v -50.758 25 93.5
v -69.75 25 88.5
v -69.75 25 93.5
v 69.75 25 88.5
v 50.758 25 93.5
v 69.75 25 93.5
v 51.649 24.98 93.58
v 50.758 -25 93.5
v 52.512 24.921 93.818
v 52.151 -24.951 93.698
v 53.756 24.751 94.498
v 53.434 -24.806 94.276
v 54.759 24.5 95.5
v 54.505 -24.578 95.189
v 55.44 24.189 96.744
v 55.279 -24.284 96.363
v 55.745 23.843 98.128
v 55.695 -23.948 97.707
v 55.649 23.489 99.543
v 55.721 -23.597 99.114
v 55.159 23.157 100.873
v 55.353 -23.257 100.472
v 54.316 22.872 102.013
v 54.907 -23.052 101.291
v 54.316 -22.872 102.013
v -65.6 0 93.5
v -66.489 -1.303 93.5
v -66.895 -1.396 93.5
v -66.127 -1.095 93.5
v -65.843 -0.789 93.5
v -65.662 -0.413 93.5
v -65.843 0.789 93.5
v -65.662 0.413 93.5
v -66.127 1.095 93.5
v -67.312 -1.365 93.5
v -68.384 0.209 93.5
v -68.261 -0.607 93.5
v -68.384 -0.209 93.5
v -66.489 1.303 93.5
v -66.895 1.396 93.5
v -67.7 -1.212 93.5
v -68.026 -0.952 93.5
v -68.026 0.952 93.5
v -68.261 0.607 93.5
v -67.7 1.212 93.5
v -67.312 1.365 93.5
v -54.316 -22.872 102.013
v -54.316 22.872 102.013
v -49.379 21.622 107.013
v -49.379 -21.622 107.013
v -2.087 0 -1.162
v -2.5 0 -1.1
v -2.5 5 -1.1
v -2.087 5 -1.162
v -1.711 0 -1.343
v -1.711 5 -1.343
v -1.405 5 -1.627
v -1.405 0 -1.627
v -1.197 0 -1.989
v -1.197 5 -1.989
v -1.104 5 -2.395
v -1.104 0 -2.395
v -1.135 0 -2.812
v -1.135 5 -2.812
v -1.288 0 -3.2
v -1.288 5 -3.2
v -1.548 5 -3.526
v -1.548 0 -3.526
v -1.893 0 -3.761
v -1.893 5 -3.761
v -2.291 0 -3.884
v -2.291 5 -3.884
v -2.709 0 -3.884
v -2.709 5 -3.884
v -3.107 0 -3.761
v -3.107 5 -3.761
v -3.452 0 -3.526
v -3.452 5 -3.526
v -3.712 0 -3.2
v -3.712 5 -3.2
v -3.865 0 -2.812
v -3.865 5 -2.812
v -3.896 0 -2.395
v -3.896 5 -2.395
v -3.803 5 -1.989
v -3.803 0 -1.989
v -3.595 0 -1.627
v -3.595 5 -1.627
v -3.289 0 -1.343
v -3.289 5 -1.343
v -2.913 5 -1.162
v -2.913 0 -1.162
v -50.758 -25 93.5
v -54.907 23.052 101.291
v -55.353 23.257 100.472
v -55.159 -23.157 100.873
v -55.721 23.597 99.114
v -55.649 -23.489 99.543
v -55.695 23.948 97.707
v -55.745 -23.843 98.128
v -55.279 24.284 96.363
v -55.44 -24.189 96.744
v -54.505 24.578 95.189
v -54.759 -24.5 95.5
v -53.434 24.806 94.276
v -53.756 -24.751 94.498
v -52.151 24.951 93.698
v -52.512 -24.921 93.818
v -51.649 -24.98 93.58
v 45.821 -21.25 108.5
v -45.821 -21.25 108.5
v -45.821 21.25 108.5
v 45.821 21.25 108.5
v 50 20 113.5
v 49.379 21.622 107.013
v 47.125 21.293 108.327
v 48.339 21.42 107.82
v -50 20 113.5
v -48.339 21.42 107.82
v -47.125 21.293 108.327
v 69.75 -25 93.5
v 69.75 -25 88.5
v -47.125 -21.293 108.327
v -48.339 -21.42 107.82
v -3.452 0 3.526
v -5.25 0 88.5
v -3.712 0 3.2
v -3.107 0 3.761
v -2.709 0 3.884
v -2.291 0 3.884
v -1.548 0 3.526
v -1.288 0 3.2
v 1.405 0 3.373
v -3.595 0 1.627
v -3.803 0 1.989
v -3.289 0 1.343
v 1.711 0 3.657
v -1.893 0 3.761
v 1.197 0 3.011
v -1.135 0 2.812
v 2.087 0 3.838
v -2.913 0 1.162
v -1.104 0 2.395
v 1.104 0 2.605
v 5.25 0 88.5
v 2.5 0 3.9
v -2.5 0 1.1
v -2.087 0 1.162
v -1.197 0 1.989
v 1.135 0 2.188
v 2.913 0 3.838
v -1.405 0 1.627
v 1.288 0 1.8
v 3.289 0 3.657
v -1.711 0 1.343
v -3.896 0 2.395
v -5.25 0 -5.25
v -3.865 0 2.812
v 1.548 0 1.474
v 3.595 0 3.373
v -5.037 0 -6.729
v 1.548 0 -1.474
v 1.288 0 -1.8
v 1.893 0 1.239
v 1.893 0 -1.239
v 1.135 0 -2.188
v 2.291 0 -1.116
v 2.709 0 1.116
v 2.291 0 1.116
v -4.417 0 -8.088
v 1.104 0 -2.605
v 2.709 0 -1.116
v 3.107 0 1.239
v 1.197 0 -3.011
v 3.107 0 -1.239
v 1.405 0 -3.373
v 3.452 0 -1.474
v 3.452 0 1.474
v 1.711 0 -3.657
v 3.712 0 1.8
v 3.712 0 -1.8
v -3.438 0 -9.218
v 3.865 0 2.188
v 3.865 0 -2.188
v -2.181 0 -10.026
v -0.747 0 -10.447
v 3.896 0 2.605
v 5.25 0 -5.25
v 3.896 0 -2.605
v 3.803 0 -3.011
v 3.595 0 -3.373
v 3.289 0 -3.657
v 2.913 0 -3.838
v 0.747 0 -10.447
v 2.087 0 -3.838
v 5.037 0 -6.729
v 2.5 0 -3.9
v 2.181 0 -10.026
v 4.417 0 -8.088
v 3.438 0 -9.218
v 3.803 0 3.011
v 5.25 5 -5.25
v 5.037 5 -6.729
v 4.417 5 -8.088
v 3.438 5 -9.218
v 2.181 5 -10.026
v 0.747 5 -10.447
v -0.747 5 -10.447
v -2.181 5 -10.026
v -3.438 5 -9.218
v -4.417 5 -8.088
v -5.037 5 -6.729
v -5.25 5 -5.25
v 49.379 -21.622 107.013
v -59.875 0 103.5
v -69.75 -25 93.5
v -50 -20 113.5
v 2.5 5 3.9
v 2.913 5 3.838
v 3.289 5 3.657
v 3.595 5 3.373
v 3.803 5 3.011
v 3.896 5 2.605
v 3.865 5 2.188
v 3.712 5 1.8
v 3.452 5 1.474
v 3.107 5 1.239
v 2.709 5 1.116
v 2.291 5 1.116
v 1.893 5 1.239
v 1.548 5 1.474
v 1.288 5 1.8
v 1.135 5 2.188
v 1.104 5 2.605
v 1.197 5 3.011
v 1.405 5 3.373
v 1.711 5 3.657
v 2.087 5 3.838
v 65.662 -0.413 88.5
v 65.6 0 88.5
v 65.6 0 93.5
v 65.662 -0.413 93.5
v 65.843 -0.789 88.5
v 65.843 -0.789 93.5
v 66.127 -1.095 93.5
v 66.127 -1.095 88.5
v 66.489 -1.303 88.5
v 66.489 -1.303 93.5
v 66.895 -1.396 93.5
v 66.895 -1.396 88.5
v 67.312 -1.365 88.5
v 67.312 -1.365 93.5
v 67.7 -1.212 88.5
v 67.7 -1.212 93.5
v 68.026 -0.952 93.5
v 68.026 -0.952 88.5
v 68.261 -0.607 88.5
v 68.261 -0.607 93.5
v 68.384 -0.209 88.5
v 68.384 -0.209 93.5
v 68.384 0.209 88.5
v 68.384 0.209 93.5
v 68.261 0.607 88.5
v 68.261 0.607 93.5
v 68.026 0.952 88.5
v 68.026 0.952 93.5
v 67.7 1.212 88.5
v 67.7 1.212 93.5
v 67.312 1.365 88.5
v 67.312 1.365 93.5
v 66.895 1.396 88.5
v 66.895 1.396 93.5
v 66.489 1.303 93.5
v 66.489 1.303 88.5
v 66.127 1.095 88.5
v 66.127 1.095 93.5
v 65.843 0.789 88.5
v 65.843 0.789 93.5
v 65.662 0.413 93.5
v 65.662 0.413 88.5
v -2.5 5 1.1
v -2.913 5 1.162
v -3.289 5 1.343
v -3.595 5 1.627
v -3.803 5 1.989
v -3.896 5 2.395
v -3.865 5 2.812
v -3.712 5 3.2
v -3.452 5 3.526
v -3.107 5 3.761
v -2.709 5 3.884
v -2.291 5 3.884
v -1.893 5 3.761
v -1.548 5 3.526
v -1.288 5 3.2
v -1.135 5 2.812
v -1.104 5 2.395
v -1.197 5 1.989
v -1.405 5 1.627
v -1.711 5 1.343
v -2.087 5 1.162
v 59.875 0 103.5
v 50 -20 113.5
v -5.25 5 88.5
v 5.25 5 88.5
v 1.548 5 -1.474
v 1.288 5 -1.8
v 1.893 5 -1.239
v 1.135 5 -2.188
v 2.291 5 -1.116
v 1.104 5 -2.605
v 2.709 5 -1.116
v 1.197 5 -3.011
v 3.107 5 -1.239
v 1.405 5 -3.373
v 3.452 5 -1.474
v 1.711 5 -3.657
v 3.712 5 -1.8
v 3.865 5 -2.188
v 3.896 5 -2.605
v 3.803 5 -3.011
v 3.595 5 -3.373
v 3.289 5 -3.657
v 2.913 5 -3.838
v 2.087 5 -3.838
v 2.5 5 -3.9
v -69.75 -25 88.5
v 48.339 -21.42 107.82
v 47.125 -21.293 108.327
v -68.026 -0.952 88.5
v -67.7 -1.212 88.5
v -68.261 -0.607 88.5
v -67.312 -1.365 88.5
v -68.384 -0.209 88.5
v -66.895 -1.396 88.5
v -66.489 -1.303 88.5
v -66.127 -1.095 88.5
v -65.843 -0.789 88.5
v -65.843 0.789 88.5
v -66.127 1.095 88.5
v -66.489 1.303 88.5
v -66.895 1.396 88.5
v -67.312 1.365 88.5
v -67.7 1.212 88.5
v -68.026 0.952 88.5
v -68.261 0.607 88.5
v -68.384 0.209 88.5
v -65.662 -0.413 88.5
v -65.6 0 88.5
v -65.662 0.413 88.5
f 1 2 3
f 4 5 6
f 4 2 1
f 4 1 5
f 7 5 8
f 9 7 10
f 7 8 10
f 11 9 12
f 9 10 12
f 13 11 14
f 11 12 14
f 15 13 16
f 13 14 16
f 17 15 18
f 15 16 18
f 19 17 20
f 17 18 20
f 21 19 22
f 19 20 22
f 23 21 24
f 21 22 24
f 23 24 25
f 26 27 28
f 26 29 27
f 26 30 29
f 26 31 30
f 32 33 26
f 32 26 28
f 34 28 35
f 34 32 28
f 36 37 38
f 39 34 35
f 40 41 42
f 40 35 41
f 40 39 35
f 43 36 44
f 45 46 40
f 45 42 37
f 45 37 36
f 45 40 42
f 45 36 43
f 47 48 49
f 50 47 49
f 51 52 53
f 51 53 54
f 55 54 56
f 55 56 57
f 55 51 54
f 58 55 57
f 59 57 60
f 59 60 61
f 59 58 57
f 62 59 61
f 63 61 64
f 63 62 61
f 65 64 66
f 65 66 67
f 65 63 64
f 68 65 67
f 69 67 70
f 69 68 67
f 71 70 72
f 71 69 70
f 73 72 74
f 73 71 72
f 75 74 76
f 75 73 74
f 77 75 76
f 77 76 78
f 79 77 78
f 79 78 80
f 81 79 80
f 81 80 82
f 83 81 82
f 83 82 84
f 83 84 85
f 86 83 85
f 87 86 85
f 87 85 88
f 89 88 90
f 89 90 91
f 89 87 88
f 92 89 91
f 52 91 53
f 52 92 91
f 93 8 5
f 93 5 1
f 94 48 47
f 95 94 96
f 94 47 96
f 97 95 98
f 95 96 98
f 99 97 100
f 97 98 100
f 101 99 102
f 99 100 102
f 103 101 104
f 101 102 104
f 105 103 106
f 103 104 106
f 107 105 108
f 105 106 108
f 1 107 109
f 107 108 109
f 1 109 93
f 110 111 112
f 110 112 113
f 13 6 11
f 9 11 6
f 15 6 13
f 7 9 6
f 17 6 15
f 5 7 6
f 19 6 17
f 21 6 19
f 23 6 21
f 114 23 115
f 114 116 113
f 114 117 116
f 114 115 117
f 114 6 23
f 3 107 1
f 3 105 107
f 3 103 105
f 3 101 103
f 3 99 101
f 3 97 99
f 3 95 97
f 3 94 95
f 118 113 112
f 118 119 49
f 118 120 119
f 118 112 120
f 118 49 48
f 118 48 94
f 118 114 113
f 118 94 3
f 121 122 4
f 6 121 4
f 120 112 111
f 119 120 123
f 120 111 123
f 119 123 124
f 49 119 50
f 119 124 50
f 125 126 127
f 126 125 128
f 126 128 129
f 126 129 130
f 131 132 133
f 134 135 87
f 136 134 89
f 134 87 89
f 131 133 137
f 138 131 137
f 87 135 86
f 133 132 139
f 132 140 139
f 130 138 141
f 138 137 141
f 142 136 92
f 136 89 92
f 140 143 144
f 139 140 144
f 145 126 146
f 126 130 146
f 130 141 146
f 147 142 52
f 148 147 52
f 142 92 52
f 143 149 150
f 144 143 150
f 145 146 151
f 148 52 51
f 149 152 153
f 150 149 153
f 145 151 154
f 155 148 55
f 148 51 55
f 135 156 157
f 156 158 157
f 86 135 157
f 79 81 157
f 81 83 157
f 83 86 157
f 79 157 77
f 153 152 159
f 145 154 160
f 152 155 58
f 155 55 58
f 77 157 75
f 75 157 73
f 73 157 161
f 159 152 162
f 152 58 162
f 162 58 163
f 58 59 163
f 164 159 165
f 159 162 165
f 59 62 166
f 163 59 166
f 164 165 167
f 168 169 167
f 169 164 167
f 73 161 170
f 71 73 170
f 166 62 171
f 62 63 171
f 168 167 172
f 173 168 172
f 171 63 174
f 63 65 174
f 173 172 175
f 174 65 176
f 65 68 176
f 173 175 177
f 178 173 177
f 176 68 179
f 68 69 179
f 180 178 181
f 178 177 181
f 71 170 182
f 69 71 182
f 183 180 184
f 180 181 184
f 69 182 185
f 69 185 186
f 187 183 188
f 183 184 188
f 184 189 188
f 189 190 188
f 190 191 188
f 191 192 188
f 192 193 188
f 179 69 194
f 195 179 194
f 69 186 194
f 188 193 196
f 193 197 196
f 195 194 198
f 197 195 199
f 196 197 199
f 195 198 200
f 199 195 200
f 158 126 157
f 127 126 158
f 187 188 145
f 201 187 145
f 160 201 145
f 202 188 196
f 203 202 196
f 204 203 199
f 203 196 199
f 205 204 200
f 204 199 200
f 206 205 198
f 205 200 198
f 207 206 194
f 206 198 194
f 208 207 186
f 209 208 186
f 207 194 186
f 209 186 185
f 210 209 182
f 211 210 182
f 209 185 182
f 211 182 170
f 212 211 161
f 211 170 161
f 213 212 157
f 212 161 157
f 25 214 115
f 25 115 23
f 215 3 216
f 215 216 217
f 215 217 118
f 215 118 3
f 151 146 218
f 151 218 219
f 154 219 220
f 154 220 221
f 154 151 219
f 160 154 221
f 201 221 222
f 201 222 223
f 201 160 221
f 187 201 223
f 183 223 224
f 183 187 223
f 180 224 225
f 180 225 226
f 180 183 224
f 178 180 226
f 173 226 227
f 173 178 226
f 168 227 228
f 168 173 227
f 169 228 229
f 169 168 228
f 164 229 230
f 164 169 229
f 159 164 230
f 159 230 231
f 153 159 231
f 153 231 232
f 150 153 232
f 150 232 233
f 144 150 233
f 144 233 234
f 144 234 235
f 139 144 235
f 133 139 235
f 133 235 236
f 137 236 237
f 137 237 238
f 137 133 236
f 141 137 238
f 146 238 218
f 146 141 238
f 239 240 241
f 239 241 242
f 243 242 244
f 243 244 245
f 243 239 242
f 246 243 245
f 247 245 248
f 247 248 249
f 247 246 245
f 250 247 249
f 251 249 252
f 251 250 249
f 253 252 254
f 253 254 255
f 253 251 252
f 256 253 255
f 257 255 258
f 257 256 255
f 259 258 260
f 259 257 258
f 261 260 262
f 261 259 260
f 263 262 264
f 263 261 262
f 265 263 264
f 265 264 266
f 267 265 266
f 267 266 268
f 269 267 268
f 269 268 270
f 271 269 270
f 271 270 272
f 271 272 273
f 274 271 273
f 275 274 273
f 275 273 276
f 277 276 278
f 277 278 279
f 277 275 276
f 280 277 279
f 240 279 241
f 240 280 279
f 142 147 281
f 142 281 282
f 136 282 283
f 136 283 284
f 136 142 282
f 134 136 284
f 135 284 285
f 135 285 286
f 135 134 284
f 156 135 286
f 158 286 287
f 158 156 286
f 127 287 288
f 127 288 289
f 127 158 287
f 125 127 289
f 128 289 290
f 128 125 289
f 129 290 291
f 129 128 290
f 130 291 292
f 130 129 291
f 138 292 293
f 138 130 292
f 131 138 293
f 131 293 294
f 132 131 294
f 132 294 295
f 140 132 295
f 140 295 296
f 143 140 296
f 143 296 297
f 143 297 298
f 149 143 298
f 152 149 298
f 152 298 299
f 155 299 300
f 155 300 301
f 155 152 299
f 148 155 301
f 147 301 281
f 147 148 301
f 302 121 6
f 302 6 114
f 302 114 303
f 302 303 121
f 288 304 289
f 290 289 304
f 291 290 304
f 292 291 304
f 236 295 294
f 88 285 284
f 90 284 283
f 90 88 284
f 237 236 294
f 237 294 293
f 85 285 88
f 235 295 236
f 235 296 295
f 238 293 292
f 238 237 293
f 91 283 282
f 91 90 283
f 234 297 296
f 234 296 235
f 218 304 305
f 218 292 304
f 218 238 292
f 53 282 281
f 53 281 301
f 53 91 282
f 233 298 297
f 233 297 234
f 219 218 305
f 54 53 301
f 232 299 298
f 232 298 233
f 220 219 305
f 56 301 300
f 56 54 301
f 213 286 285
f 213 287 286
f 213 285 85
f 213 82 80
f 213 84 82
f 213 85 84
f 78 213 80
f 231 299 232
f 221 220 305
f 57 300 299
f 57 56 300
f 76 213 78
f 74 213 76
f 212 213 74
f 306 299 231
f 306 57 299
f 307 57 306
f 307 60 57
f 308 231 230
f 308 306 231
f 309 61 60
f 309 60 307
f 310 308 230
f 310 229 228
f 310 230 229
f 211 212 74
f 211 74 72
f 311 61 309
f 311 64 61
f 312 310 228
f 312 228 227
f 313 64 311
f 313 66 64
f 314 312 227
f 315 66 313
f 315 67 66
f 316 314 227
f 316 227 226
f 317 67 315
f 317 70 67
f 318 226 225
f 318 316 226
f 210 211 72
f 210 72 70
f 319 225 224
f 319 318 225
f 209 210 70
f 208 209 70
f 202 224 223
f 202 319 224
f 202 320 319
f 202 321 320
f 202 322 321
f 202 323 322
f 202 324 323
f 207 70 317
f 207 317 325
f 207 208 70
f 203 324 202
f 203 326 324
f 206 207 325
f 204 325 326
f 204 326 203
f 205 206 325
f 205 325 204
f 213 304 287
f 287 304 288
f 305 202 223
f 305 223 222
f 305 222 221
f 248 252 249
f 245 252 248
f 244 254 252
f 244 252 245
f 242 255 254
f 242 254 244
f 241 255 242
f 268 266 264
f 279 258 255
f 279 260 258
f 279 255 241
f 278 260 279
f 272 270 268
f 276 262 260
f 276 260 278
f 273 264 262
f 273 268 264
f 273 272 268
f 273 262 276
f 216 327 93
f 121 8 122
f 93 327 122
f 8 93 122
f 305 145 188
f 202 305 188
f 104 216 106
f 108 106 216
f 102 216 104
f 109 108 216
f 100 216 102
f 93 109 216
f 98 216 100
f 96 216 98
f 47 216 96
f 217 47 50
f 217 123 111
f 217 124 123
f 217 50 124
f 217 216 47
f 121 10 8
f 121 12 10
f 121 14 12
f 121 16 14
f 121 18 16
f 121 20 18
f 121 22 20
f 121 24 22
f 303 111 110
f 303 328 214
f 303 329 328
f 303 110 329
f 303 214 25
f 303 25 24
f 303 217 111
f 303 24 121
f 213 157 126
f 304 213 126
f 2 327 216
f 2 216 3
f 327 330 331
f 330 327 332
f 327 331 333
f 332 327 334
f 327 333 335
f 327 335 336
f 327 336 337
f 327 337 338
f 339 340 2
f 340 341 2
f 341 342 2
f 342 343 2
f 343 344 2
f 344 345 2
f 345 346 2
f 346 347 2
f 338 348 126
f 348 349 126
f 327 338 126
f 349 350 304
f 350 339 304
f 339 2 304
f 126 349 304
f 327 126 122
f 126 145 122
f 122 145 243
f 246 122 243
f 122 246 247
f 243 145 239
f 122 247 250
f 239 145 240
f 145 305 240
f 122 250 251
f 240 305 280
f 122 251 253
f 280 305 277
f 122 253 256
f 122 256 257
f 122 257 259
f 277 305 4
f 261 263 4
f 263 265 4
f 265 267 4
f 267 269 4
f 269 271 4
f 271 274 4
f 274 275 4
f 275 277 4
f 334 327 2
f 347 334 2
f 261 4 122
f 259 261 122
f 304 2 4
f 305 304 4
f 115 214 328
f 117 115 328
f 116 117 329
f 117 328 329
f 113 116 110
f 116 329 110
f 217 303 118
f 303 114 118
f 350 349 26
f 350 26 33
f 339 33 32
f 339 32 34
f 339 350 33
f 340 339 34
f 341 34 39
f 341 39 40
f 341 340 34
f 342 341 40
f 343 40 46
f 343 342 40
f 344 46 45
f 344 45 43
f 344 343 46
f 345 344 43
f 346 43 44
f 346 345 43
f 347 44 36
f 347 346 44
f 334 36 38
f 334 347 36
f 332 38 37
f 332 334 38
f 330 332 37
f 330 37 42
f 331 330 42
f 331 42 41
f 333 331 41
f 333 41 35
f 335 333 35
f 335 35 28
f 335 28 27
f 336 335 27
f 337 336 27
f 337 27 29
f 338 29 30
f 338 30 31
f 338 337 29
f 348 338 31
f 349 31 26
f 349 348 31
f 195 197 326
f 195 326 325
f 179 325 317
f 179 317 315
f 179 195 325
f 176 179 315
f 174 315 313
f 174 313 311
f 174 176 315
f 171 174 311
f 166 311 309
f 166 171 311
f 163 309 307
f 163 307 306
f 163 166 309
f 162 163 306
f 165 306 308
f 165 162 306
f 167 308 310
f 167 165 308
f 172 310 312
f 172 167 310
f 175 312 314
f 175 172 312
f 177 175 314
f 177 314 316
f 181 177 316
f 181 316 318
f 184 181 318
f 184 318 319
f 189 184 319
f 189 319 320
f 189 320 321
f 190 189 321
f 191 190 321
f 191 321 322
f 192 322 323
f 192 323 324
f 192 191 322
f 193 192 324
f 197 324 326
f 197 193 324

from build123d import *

# Parameters (mm, degrees)
SKETCH1_R               = 1.4
BOSS_EXTRUDE1_DEPTH     = 5
SKETCH3_W               = 139.5
SKETCH3_H               = 50
SKETCH3_R               = 1.4
BOSS_EXTRUDE3_DEPTH     = 5
CUT_EXTRUDE1_DEPTH      = 136.544503915
CUT_EXTRUDE1_DEPTH_BACK = 136.544503915
FILLET1_START           = -25
FILLET1_DEPTH           = 50
FILLET1_START_2         = -21.62169291
FILLET1_2_DEPTH         = 43.24338582
FILLET1_START_3         = -69.75
FILLET1_3_DEPTH         = 139.5


with BuildPart() as part:
    # Sketch1 → Boss-Extrude1 (new body)
    with BuildSketch(Plane(origin=(0, 0, 0), x_dir=(1, 0, 0), z_dir=(0, 1, 0))):
        with BuildLine():
            Line((-5.25, 5.25), (-5.25, -88.5))
            Line((-5.25, -88.5), (5.25, -88.5))
            Line((5.25, -88.5), (5.25, 5.25))
            ThreePointArc((5.25, 5.25), (0, 10.5), (-5.25, 5.25))
        make_face()
        with Locations(Location((-2.5, 2.5, 0), (0, 0, 270))):
            Circle(SKETCH1_R, mode=Mode.SUBTRACT)
        with Locations(Location((2.5, 2.5, 0), (0, 0, 90))):
            Circle(SKETCH1_R, mode=Mode.SUBTRACT)
        with Locations(Location((-2.5, -2.5, 0), (0, 0, 90))):
            Circle(SKETCH1_R, mode=Mode.SUBTRACT)
        with Locations(Location((2.5, -2.5, 0), (0, 0, 270))):
            Circle(SKETCH1_R, mode=Mode.SUBTRACT)
    extrude(amount=BOSS_EXTRUDE1_DEPTH)

    # Sketch3 → Boss-Extrude3 (add)
    with BuildSketch(Plane.XY.offset(88.5)):
        Rectangle(SKETCH3_W, SKETCH3_H)
        with Locations((-67, 0)):
            Circle(SKETCH3_R, mode=Mode.SUBTRACT)
        with Locations(Location((67, 0, 0), (0, 0, 180))):
            Circle(SKETCH3_R, mode=Mode.SUBTRACT)
    extrude(amount=BOSS_EXTRUDE3_DEPTH)

    # Sketch4 → Loft1 section 0
    with BuildSketch(Plane.XY.offset(93.5)):
        with BuildLine():
            Line((69.75, -25), (69.75, 25))
            Line((69.75, 25), (-69.75, 25))
            Line((-69.75, 25), (-69.75, -25))
            Line((-69.75, -25), (69.75, -25))
        make_face()
    # Sketch5 → Loft1 section 1
    with BuildSketch(Plane.XY.offset(113.5)):
        with BuildLine():
            Line((-50, -20), (50, -20))
            Line((50, -20), (50, 20))
            Line((50, 20), (-50, 20))
            Line((-50, 20), (-50, -20))
        make_face()
    loft()

    # Sketch6 → Cut-Extrude1 (cut, two sides: drawn at the far end of the back side and taken through both)
    with BuildSketch(Plane(origin=(0, 0, 0), x_dir=(1, 0, 0), z_dir=(0, 1, 0)).offset(-CUT_EXTRUDE1_DEPTH_BACK)):
        Polygon((-47.910487388, -108.5), (47.910487388, -108.5), (62.722987388, -93.5), (-62.722987388, -93.5), align=None)
    extrude(amount=CUT_EXTRUDE1_DEPTH + CUT_EXTRUDE1_DEPTH_BACK, mode=Mode.SUBTRACT)

    # Fillet1: read off the stored shape, not the designer's step
    # Fillet1 outline → Fillet1 (add)
    with BuildSketch(Plane(origin=(0, 0, 0), x_dir=(1, 0, 0), z_dir=(0, 1, 0)).offset(FILLET1_START)):
        with BuildLine():
            Line((-62.722987388, -93.5), (-54.316174382, -102.013228361))
            ThreePointArc((-54.316174382, -102.013228361), (-55.371832653, -96.572066106), (-50.758474776, -93.5))
            Line((-50.758474776, -93.5), (-62.722987388, -93.5))
        make_face()
        with BuildLine():
            ThreePointArc((50.758474776, -93.5), (55.371832653, -96.572066106), (54.316174382, -102.013228361))
            Line((54.316174382, -102.013228361), (62.722987388, -93.5))
            Line((62.722987388, -93.5), (50.758474776, -93.5))
        make_face()
    extrude(amount=FILLET1_DEPTH)

    # Fillet1 2 outline → Fillet1 2 (add)
    with BuildSketch(Plane(origin=(0, 0, 0), x_dir=(1, 0, 0), z_dir=(0, 1, 0)).offset(FILLET1_START_2)):
        with BuildLine():
            Line((-47.910487388, -108.5), (-45.820974776, -108.5))
            ThreePointArc((-45.820974776, -108.5), (-47.74890867, -108.113357877), (-49.378674382, -107.013228361))
            Line((-49.378674382, -107.013228361), (-47.910487388, -108.5))
        make_face()
        with BuildLine():
            ThreePointArc((49.378674382, -107.013228361), (47.74890867, -108.113357877), (45.820974776, -108.5))
            Line((45.820974776, -108.5), (47.910487388, -108.5))
            Line((47.910487388, -108.5), (49.378674382, -107.013228361))
        make_face()
    extrude(amount=FILLET1_2_DEPTH)

    # Fillet1 3 outline → Fillet1 3 (cut)
    with BuildSketch(Plane.YZ.offset(FILLET1_START_3)):
        Polygon((25, 93.5), (25, 110), (20.875, 110), align=None)
        Polygon((-20.875, 110), (-25, 110), (-25, 93.5), align=None)
    extrude(amount=FILLET1_3_DEPTH, mode=Mode.SUBTRACT)


solid = part.part
